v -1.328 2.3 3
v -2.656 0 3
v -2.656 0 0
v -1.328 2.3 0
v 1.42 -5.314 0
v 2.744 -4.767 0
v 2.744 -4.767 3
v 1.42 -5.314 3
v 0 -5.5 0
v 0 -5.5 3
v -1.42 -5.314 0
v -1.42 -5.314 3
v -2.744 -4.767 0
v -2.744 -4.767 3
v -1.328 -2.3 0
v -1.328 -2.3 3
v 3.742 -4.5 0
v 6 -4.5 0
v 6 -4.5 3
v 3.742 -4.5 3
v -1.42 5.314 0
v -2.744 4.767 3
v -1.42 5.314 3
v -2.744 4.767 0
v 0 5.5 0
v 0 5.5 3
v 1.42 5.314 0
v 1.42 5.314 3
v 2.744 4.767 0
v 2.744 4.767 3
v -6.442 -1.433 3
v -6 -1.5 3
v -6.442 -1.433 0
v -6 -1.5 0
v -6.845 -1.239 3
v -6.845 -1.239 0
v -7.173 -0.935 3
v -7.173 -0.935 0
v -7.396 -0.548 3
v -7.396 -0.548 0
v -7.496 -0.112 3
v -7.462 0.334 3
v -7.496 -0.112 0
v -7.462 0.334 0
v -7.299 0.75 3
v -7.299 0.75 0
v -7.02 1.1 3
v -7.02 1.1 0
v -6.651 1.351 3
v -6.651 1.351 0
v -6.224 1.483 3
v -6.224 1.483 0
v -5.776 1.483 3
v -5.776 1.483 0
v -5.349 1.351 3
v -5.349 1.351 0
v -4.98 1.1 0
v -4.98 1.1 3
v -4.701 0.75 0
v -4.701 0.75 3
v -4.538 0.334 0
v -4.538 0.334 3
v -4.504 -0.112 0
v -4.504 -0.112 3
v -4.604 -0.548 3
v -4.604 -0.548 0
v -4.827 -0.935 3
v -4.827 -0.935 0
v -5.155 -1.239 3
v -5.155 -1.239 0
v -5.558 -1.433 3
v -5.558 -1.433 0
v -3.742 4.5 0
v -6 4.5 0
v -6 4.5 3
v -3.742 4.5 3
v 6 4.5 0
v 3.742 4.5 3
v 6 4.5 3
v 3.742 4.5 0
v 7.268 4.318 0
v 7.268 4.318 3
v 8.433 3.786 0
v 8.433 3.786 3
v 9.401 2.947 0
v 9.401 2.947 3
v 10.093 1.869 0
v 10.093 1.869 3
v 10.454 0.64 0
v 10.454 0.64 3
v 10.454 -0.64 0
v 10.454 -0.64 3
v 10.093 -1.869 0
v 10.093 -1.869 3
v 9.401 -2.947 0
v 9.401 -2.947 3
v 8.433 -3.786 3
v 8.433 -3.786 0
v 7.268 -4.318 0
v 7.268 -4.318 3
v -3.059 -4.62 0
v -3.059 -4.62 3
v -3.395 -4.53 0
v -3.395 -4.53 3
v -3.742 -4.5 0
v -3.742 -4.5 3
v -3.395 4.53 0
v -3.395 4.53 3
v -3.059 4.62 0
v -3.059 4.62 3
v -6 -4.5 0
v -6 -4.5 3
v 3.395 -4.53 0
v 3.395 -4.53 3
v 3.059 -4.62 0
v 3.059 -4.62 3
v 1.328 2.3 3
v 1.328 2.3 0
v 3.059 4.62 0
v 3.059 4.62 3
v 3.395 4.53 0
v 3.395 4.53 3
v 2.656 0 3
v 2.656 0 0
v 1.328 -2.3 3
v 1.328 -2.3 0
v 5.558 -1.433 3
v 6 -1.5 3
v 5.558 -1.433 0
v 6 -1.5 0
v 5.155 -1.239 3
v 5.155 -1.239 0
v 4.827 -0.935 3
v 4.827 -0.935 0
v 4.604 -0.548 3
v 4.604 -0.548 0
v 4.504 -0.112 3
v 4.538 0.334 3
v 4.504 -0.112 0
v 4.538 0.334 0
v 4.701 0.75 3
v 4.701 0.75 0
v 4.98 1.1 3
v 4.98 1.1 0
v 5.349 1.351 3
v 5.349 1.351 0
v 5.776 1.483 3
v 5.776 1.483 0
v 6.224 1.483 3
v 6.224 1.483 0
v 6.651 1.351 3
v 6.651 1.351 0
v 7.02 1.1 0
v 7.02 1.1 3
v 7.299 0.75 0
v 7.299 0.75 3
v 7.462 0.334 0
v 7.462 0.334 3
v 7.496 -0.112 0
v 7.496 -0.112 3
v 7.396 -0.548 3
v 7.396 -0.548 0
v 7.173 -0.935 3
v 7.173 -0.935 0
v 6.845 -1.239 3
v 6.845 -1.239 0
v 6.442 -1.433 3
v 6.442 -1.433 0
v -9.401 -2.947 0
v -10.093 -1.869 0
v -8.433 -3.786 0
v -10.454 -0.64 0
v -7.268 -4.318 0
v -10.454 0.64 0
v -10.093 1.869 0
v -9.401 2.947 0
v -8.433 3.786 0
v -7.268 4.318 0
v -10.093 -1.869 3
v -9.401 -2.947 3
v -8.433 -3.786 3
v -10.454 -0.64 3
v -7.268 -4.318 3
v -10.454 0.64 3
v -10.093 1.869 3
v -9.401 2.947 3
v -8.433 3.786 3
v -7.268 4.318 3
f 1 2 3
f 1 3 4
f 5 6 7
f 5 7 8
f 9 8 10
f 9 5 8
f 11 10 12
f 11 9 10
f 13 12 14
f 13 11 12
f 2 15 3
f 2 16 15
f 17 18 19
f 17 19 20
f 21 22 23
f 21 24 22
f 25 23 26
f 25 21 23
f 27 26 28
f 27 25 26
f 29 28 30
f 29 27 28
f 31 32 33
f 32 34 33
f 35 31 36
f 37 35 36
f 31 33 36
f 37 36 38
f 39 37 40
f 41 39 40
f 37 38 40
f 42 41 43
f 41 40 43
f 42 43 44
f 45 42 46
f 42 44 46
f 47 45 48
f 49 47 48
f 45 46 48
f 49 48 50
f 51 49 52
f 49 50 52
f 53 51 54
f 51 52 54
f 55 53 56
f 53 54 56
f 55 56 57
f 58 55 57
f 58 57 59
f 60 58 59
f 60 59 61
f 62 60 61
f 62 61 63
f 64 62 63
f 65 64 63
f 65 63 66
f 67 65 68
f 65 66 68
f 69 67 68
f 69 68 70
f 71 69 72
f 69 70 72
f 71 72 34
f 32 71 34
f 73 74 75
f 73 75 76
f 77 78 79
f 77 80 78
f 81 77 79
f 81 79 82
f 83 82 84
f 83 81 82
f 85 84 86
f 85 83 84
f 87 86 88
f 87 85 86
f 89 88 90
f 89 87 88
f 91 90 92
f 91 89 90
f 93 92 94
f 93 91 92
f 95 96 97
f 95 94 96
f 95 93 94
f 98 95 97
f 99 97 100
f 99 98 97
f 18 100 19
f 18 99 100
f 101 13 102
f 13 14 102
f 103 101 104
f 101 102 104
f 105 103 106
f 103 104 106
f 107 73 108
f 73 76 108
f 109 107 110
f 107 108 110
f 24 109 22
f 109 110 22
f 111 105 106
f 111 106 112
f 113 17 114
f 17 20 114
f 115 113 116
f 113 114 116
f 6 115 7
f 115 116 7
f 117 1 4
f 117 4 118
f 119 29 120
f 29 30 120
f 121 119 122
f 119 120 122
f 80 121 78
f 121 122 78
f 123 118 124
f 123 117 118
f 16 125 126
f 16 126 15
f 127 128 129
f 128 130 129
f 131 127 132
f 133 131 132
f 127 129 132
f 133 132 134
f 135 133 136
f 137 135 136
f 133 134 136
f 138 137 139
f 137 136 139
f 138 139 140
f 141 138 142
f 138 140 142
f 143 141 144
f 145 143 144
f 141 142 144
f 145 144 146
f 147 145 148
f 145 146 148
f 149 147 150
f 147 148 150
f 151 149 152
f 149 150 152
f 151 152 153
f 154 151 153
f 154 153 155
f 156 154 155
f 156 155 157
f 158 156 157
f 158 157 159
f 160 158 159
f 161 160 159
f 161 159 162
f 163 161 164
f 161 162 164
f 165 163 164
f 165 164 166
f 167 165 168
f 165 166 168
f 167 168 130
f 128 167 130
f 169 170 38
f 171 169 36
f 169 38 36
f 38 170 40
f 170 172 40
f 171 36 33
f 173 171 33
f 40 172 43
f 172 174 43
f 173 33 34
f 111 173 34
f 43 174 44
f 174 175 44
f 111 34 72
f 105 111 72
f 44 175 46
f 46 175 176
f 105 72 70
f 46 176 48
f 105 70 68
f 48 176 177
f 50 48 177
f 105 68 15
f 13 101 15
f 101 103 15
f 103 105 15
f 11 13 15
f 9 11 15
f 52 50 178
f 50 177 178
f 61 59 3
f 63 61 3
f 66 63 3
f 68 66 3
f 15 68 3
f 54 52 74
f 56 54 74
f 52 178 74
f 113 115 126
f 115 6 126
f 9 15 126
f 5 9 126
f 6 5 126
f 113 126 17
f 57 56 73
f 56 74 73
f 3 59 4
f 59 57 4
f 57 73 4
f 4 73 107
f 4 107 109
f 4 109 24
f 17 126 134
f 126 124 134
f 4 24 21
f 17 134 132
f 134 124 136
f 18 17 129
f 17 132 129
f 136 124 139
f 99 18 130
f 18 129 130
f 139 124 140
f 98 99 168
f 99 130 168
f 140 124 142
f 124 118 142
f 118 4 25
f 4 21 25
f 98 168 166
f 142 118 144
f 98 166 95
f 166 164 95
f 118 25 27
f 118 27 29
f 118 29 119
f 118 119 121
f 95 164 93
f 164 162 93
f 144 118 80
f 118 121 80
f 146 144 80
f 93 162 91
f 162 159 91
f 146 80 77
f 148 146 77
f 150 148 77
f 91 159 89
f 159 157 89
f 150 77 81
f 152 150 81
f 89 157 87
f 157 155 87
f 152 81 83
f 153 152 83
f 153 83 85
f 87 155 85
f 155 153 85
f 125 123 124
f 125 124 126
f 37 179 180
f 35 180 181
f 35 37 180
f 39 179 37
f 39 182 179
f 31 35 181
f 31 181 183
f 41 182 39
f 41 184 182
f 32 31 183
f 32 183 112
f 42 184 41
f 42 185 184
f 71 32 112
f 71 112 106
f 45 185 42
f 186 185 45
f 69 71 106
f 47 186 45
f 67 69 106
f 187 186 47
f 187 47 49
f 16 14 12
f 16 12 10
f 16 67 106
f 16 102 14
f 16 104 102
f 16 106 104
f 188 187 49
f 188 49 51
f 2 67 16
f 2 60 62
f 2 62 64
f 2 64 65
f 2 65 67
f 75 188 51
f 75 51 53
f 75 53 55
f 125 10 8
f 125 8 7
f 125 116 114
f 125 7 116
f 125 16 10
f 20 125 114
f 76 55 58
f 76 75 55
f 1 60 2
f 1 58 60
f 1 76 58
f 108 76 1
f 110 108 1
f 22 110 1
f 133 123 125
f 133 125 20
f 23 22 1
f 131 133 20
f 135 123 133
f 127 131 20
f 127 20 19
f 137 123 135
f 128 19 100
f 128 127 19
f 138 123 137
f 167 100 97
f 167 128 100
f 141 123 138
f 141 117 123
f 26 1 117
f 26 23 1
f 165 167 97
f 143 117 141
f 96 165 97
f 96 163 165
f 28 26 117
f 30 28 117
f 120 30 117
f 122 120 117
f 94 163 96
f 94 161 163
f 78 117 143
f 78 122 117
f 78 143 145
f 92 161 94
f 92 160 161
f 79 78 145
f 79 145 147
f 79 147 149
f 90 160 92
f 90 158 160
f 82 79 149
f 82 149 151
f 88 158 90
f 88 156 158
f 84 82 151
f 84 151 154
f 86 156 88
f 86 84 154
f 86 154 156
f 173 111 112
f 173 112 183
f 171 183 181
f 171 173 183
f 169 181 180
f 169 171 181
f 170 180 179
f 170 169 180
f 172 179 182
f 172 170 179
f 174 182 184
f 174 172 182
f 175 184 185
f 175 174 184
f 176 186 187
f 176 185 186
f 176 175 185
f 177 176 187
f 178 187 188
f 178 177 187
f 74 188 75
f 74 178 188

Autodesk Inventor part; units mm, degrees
ref_plane "YZ Plane" through (0, 0, 0) normal (1, 0, 0) x (0, 1, 0)
ref_plane "XZ Plane" through (0, 0, 0) normal (0, 1, 0) x (-1, 0, 0)
ref_plane "XY Plane" through (0, 0, 0) normal (0, 0, 1) x (1, 0, 0)
sketch "Sketch1" plane through (0, 0, 0) normal (0, 0, 1) x (1, 0, 0)
  circle A0 centre (0, 0) radius 5.5
  arc A1 (6, -4.5) -> (6, 4.5) centre (6, 0) ccw
  arc A2 (-6, 4.5) -> (-6, -4.5) centre (-6, 0) ccw
  line L0 (-6, 4.5) -> (6, 4.5)
  line L1 (6, -4.5) -> (-6, -4.5)
  dimension "d0" = 11
  dimension "d5" = 9
  dimension "d6" = 6
  dimension "d7" = 9
  dimension "d8" = 6
extrude "Extrusion1" add sketch "Sketch1" along normal blind 3
fillet "圓角1" radius 2 4 edges at (3.1623, -4.5, 1.5) (-3.1623, -4.5, 1.5) (3.1623, 4.5, 1.5) (-3.1623, 4.5, 1.5)
sketch "草圖3" plane through (0, 0, 3) normal (0, 0, 1) x (1, 0, 0)
  arc A0 (-6, 4.5) -> (-6, -4.5) centre (-6, 0) ccw projected
  arc A1 (6, -4.5) -> (6, 4.5) centre (6, 0) ccw projected
hole "孔1" at (-6, 0, 3) at (6, 0, 3) direction (0, 0, -1) diameter 3 end through all
sketch "草圖4" plane through (0, 0, 3) normal (0, 0, 1) x (1, 0, 0)
  arc A0 (2.7439, 4.7667) -> (-2.7439, 4.7667) centre (0, 0) ccw projected
  line L0 (1.3279, 2.3) -> (2.6558, 0)
  line L1 (2.6558, 0) -> (1.3279, -2.3)
  line L2 (1.3279, -2.3) -> (-1.3279, -2.3)
  line L3 (-1.3279, -2.3) -> (-2.6558, 0)
  line L4 (-2.6558, 0) -> (-1.3279, 2.3)
  line L5 (-1.3279, 2.3) -> (1.3279, 2.3)
  dimension "d17" = 4.6
extrude "擠出2" cut sketch "草圖4" against normal through all
properties part number "plastic_part_99"
